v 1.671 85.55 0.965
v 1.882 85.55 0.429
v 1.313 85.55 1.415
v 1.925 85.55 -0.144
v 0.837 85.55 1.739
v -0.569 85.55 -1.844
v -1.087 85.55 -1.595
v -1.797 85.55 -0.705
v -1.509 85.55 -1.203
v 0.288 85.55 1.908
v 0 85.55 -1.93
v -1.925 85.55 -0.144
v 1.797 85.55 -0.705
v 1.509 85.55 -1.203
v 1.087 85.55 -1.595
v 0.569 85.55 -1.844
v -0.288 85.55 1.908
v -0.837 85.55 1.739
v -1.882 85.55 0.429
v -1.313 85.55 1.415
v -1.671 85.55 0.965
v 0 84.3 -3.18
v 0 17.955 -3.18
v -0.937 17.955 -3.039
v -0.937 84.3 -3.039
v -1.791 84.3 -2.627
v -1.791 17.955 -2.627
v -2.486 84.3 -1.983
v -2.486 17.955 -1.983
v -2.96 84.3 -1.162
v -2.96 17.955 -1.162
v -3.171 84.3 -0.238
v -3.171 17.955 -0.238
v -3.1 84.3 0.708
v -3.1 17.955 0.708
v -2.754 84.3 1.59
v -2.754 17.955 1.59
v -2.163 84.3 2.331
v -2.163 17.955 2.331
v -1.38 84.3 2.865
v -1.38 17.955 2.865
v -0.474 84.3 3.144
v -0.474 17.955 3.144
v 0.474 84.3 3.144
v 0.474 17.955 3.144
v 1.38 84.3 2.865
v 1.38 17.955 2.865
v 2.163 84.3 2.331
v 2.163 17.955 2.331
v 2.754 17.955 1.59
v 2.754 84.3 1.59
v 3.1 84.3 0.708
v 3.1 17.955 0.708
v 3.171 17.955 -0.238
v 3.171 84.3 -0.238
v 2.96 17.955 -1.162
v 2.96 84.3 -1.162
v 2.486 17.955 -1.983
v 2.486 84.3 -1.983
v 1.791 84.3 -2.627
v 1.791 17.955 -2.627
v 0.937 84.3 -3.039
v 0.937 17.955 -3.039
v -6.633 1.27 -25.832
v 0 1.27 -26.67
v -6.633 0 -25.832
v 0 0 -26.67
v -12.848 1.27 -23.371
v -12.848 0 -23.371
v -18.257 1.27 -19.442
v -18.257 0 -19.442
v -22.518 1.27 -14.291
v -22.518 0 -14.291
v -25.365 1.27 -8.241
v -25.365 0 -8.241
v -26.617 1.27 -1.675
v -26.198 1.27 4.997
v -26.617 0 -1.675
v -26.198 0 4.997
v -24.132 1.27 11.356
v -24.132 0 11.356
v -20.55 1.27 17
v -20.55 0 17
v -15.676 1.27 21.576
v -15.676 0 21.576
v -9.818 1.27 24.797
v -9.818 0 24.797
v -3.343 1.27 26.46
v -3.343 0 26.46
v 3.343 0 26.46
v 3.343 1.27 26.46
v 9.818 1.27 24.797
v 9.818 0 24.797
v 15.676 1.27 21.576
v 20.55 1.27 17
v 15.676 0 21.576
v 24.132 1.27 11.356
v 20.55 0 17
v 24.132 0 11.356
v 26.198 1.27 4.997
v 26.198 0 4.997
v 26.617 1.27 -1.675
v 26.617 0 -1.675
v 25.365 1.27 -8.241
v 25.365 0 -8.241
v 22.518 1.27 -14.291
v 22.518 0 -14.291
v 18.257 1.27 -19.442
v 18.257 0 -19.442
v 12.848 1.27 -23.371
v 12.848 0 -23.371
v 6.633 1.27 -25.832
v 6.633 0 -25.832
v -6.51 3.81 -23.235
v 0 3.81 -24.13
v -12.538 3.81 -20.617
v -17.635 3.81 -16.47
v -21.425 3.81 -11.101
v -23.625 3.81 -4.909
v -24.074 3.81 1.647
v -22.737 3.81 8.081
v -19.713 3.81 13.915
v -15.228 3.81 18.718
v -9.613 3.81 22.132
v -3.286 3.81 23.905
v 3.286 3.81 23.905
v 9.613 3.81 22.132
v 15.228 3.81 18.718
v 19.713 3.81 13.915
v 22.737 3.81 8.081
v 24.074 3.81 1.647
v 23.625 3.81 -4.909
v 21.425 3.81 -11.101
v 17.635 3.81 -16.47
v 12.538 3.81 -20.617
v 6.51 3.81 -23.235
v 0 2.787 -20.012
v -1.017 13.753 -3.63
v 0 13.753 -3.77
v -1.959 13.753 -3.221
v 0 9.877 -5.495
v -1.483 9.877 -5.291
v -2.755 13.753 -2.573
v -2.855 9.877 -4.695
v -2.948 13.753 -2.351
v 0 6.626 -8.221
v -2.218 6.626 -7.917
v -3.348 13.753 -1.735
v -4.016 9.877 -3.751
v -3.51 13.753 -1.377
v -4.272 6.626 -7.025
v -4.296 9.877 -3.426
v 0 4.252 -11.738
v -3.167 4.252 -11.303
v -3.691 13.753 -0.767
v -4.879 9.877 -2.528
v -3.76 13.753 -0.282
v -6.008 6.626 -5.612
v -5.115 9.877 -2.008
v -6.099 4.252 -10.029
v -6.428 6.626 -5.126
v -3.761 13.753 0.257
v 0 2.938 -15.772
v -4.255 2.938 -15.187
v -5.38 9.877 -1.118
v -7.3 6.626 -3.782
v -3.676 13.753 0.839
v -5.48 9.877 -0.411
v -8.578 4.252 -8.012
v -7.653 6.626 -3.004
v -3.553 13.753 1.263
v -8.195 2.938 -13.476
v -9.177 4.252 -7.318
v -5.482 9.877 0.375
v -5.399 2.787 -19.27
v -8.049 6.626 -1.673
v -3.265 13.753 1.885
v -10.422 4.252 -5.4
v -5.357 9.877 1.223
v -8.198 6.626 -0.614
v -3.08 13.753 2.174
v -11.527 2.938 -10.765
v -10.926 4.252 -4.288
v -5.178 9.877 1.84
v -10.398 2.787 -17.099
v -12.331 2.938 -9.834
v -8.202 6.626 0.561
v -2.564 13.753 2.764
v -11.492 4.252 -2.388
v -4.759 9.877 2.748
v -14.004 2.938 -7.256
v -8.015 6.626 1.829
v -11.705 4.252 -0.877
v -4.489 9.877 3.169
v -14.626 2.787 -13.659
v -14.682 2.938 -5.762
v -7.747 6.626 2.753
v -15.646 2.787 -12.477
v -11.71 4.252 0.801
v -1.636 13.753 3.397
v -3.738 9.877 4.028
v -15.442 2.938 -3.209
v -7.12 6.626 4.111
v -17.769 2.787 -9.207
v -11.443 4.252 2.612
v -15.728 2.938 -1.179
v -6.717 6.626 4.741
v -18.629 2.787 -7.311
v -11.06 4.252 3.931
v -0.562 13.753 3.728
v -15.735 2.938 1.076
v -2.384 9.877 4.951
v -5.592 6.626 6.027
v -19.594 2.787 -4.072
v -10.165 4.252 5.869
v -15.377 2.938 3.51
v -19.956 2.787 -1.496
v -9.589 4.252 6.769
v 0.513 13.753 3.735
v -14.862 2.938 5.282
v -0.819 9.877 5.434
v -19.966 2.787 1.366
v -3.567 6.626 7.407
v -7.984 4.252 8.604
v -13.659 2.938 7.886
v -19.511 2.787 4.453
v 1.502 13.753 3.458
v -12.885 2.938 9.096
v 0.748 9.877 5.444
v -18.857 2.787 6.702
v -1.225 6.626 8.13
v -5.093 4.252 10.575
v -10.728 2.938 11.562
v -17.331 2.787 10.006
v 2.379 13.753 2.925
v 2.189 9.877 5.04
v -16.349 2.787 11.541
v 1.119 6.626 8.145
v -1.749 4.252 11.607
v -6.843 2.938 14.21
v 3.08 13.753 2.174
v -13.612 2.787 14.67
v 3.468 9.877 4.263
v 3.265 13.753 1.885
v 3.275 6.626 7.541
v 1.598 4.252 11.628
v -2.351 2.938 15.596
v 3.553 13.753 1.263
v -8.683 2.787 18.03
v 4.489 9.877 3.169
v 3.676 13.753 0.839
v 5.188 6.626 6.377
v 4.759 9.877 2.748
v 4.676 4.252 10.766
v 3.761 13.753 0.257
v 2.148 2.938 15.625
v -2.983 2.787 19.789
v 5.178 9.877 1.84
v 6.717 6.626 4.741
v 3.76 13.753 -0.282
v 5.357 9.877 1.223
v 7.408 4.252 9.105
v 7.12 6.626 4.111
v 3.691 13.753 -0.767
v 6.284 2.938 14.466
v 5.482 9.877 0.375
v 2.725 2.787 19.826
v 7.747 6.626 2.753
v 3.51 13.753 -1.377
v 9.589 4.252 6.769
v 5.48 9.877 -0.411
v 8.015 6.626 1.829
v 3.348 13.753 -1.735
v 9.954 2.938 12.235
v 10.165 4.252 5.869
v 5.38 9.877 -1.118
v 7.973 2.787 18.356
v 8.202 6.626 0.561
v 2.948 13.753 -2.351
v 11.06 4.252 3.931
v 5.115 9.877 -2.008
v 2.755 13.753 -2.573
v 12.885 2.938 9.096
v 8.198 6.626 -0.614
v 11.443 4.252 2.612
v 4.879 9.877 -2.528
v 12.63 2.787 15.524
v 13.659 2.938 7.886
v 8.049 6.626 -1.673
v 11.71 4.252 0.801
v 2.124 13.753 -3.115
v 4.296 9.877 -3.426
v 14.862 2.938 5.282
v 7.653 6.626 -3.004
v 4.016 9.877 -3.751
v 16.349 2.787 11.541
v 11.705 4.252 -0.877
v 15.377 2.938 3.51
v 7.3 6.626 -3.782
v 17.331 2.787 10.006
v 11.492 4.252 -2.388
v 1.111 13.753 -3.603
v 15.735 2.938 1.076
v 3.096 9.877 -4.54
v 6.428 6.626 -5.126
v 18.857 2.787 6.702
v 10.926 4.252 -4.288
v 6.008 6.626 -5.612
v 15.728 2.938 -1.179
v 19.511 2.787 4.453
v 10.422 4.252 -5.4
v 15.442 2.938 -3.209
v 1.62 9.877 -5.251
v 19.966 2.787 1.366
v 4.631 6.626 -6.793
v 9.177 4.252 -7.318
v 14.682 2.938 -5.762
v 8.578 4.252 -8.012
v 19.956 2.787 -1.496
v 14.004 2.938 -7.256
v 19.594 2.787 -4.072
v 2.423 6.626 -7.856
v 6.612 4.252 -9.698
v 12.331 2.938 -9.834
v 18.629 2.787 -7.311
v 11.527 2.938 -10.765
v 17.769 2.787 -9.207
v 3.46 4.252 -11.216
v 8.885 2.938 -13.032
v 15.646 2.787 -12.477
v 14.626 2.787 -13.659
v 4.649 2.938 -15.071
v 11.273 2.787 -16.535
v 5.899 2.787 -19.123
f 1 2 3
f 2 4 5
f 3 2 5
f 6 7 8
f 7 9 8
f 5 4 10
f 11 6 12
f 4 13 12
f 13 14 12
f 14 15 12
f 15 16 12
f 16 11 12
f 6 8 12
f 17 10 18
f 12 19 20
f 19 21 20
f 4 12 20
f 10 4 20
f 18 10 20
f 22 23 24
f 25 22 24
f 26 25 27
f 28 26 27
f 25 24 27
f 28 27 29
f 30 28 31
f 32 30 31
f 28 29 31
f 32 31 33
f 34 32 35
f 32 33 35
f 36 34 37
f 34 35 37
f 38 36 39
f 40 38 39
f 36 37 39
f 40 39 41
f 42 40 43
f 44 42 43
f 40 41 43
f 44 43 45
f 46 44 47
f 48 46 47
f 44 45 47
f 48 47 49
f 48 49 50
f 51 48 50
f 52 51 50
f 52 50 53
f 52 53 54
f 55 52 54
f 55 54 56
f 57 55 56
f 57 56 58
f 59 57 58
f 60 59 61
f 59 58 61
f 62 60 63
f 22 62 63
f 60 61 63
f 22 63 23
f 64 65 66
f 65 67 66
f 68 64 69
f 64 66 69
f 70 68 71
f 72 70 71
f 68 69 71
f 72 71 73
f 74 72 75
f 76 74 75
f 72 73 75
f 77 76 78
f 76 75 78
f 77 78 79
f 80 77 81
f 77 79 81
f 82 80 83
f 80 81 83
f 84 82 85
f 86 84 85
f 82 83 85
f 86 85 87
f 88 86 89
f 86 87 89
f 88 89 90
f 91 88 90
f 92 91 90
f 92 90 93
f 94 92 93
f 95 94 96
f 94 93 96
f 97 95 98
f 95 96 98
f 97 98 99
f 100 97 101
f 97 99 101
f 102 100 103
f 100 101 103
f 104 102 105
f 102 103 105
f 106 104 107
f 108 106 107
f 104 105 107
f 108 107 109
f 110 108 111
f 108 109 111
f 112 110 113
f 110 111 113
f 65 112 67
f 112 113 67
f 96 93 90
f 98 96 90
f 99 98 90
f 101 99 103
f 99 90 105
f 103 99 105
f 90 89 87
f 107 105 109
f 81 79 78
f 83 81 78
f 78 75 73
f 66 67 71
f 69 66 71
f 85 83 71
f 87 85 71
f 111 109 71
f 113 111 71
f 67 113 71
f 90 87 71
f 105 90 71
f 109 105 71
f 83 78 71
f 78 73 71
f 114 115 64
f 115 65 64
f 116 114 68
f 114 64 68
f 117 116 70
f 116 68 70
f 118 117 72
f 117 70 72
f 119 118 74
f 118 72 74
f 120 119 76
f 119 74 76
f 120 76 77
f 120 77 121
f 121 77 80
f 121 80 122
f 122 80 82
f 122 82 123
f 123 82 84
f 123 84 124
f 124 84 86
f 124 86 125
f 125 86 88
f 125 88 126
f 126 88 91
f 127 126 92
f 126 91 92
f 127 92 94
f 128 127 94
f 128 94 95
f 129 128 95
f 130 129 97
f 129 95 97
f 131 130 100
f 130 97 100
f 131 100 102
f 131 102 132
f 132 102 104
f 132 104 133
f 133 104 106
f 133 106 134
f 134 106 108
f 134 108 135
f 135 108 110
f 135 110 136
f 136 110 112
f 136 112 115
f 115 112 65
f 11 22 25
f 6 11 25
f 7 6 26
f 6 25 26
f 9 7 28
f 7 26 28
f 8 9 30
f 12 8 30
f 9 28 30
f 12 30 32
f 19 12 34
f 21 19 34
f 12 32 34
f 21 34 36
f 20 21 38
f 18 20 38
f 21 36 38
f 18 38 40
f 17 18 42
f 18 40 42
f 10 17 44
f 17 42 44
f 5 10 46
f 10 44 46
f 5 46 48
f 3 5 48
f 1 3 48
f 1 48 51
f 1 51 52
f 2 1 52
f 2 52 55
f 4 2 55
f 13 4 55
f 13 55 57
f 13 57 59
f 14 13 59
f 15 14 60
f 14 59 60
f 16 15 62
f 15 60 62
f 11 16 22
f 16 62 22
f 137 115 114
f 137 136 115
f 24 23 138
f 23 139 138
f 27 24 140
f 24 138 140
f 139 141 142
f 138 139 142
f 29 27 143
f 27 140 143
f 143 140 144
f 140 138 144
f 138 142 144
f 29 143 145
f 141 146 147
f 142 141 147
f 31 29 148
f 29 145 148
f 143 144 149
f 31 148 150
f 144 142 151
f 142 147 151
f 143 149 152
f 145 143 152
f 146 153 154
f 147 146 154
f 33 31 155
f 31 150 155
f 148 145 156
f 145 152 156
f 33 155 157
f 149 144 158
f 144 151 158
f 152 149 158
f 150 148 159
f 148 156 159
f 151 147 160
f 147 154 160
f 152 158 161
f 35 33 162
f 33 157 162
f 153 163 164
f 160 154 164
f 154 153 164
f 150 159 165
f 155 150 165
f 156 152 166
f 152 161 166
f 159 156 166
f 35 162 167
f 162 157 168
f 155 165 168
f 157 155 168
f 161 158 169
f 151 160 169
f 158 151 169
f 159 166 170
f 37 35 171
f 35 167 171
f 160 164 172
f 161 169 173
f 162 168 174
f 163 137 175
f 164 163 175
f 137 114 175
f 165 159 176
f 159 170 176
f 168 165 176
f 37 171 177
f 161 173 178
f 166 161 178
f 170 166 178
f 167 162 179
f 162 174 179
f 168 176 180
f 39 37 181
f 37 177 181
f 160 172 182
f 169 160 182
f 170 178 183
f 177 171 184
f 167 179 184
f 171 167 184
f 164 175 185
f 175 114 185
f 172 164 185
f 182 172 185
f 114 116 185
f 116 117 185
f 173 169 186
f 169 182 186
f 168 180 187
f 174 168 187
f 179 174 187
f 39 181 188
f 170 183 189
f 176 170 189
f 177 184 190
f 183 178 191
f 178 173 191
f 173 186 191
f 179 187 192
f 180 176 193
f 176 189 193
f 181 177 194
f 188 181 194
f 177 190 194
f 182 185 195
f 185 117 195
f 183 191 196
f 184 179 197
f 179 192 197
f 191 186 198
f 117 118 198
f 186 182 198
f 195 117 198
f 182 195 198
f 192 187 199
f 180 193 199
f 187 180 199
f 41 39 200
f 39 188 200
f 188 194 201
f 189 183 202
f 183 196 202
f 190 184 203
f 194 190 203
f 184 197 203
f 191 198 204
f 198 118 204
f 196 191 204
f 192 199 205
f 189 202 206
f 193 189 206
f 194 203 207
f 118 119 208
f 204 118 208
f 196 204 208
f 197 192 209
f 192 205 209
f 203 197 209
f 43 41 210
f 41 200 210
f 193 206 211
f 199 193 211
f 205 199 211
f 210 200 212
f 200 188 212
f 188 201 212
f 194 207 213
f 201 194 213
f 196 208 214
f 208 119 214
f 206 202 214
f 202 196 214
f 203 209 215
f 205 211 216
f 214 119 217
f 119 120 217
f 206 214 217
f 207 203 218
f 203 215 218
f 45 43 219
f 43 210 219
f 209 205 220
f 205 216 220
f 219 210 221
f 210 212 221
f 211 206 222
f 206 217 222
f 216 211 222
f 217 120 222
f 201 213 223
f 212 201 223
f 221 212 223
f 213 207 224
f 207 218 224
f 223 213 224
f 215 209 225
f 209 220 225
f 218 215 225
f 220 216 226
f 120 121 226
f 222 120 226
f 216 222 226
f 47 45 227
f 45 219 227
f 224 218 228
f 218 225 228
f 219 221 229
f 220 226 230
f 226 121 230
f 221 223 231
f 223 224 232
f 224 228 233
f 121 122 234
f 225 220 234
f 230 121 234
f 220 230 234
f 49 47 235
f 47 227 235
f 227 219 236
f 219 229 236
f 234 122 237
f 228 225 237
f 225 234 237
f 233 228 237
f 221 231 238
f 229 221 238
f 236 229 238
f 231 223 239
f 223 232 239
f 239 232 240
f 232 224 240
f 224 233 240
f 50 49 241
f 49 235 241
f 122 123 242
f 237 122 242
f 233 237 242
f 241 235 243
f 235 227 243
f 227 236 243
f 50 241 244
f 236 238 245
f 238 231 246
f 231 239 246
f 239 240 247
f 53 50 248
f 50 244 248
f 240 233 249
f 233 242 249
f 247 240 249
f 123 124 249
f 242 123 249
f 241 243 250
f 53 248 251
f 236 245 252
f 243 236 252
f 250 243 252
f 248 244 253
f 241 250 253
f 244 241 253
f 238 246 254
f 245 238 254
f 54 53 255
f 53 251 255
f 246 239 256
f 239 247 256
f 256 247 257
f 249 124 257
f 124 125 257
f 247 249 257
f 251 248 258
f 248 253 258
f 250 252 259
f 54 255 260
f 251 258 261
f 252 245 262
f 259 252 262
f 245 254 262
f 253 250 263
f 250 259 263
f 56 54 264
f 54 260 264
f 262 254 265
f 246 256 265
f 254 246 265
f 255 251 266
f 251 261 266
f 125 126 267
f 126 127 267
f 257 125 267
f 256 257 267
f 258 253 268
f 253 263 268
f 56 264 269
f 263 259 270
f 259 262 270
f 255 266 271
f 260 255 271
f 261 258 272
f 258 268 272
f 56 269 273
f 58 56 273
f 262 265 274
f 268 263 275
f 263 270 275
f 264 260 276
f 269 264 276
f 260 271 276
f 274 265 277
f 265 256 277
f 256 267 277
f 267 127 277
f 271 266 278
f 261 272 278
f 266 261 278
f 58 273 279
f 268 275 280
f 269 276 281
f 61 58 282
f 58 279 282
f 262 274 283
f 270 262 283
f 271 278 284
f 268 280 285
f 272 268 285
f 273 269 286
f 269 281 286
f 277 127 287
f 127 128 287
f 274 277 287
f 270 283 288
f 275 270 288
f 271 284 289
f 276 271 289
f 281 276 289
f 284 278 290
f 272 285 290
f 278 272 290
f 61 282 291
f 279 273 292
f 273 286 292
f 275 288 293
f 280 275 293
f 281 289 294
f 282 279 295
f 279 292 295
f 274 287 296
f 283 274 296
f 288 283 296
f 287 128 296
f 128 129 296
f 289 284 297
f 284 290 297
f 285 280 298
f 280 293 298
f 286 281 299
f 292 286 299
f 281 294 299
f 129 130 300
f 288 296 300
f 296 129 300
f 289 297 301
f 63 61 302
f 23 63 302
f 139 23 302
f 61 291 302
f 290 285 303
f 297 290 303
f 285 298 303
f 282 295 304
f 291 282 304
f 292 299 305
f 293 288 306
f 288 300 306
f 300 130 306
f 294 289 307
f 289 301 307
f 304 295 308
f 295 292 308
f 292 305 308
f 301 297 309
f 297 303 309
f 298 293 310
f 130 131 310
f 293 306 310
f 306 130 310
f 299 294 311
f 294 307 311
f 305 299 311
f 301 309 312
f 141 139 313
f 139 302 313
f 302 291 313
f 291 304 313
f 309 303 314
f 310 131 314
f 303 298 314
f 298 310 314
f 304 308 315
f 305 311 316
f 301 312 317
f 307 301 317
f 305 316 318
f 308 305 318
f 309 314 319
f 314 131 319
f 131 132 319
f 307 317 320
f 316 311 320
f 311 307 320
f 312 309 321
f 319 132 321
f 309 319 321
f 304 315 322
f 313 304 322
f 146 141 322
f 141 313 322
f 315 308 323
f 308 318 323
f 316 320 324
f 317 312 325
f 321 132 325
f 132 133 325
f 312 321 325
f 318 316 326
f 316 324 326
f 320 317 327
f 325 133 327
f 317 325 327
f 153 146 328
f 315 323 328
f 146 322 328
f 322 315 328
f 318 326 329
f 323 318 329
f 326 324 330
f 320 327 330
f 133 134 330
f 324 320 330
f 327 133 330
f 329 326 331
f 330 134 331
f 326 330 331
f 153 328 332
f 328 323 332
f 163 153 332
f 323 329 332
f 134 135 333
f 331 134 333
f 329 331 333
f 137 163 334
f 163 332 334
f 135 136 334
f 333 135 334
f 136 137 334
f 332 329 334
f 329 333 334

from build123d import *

# Parameters (mm, degrees)
CHAFL_N1_SIZE = 1.25


with BuildPart() as part:
    # Croquis1 → Revolución1 (revolve)
    with BuildSketch(Plane(origin=(0, 0, 0), x_dir=(0, 0, -1), z_dir=(1, 0, 0))):
        with BuildLine():
            Line((0, 0), (0, 85.55))
            Line((0, 85.55), (3.18, 85.55))
            Line((3.18, 85.55), (3.18, 17.954698654))
            ThreePointArc((3.18, 17.954698654), (9.896609701, 5.315721242), (24.13, 3.81))
            Line((24.13, 3.81), (26.67, 1.27))
            Line((26.67, 1.27), (26.67, 0))
            Line((26.67, 0), (0, 0))
        make_face()
    revolve(axis=Axis((0, 0, 0), (0, 1, 0)))

    # Chaflán1
    chafl_n1_edges = [part.edges().sort_by_distance(p)[0] for p in [
        (0, 85.55, 3.18),
    ]]
    chamfer(chafl_n1_edges, length=CHAFL_N1_SIZE)


solid = part.part
